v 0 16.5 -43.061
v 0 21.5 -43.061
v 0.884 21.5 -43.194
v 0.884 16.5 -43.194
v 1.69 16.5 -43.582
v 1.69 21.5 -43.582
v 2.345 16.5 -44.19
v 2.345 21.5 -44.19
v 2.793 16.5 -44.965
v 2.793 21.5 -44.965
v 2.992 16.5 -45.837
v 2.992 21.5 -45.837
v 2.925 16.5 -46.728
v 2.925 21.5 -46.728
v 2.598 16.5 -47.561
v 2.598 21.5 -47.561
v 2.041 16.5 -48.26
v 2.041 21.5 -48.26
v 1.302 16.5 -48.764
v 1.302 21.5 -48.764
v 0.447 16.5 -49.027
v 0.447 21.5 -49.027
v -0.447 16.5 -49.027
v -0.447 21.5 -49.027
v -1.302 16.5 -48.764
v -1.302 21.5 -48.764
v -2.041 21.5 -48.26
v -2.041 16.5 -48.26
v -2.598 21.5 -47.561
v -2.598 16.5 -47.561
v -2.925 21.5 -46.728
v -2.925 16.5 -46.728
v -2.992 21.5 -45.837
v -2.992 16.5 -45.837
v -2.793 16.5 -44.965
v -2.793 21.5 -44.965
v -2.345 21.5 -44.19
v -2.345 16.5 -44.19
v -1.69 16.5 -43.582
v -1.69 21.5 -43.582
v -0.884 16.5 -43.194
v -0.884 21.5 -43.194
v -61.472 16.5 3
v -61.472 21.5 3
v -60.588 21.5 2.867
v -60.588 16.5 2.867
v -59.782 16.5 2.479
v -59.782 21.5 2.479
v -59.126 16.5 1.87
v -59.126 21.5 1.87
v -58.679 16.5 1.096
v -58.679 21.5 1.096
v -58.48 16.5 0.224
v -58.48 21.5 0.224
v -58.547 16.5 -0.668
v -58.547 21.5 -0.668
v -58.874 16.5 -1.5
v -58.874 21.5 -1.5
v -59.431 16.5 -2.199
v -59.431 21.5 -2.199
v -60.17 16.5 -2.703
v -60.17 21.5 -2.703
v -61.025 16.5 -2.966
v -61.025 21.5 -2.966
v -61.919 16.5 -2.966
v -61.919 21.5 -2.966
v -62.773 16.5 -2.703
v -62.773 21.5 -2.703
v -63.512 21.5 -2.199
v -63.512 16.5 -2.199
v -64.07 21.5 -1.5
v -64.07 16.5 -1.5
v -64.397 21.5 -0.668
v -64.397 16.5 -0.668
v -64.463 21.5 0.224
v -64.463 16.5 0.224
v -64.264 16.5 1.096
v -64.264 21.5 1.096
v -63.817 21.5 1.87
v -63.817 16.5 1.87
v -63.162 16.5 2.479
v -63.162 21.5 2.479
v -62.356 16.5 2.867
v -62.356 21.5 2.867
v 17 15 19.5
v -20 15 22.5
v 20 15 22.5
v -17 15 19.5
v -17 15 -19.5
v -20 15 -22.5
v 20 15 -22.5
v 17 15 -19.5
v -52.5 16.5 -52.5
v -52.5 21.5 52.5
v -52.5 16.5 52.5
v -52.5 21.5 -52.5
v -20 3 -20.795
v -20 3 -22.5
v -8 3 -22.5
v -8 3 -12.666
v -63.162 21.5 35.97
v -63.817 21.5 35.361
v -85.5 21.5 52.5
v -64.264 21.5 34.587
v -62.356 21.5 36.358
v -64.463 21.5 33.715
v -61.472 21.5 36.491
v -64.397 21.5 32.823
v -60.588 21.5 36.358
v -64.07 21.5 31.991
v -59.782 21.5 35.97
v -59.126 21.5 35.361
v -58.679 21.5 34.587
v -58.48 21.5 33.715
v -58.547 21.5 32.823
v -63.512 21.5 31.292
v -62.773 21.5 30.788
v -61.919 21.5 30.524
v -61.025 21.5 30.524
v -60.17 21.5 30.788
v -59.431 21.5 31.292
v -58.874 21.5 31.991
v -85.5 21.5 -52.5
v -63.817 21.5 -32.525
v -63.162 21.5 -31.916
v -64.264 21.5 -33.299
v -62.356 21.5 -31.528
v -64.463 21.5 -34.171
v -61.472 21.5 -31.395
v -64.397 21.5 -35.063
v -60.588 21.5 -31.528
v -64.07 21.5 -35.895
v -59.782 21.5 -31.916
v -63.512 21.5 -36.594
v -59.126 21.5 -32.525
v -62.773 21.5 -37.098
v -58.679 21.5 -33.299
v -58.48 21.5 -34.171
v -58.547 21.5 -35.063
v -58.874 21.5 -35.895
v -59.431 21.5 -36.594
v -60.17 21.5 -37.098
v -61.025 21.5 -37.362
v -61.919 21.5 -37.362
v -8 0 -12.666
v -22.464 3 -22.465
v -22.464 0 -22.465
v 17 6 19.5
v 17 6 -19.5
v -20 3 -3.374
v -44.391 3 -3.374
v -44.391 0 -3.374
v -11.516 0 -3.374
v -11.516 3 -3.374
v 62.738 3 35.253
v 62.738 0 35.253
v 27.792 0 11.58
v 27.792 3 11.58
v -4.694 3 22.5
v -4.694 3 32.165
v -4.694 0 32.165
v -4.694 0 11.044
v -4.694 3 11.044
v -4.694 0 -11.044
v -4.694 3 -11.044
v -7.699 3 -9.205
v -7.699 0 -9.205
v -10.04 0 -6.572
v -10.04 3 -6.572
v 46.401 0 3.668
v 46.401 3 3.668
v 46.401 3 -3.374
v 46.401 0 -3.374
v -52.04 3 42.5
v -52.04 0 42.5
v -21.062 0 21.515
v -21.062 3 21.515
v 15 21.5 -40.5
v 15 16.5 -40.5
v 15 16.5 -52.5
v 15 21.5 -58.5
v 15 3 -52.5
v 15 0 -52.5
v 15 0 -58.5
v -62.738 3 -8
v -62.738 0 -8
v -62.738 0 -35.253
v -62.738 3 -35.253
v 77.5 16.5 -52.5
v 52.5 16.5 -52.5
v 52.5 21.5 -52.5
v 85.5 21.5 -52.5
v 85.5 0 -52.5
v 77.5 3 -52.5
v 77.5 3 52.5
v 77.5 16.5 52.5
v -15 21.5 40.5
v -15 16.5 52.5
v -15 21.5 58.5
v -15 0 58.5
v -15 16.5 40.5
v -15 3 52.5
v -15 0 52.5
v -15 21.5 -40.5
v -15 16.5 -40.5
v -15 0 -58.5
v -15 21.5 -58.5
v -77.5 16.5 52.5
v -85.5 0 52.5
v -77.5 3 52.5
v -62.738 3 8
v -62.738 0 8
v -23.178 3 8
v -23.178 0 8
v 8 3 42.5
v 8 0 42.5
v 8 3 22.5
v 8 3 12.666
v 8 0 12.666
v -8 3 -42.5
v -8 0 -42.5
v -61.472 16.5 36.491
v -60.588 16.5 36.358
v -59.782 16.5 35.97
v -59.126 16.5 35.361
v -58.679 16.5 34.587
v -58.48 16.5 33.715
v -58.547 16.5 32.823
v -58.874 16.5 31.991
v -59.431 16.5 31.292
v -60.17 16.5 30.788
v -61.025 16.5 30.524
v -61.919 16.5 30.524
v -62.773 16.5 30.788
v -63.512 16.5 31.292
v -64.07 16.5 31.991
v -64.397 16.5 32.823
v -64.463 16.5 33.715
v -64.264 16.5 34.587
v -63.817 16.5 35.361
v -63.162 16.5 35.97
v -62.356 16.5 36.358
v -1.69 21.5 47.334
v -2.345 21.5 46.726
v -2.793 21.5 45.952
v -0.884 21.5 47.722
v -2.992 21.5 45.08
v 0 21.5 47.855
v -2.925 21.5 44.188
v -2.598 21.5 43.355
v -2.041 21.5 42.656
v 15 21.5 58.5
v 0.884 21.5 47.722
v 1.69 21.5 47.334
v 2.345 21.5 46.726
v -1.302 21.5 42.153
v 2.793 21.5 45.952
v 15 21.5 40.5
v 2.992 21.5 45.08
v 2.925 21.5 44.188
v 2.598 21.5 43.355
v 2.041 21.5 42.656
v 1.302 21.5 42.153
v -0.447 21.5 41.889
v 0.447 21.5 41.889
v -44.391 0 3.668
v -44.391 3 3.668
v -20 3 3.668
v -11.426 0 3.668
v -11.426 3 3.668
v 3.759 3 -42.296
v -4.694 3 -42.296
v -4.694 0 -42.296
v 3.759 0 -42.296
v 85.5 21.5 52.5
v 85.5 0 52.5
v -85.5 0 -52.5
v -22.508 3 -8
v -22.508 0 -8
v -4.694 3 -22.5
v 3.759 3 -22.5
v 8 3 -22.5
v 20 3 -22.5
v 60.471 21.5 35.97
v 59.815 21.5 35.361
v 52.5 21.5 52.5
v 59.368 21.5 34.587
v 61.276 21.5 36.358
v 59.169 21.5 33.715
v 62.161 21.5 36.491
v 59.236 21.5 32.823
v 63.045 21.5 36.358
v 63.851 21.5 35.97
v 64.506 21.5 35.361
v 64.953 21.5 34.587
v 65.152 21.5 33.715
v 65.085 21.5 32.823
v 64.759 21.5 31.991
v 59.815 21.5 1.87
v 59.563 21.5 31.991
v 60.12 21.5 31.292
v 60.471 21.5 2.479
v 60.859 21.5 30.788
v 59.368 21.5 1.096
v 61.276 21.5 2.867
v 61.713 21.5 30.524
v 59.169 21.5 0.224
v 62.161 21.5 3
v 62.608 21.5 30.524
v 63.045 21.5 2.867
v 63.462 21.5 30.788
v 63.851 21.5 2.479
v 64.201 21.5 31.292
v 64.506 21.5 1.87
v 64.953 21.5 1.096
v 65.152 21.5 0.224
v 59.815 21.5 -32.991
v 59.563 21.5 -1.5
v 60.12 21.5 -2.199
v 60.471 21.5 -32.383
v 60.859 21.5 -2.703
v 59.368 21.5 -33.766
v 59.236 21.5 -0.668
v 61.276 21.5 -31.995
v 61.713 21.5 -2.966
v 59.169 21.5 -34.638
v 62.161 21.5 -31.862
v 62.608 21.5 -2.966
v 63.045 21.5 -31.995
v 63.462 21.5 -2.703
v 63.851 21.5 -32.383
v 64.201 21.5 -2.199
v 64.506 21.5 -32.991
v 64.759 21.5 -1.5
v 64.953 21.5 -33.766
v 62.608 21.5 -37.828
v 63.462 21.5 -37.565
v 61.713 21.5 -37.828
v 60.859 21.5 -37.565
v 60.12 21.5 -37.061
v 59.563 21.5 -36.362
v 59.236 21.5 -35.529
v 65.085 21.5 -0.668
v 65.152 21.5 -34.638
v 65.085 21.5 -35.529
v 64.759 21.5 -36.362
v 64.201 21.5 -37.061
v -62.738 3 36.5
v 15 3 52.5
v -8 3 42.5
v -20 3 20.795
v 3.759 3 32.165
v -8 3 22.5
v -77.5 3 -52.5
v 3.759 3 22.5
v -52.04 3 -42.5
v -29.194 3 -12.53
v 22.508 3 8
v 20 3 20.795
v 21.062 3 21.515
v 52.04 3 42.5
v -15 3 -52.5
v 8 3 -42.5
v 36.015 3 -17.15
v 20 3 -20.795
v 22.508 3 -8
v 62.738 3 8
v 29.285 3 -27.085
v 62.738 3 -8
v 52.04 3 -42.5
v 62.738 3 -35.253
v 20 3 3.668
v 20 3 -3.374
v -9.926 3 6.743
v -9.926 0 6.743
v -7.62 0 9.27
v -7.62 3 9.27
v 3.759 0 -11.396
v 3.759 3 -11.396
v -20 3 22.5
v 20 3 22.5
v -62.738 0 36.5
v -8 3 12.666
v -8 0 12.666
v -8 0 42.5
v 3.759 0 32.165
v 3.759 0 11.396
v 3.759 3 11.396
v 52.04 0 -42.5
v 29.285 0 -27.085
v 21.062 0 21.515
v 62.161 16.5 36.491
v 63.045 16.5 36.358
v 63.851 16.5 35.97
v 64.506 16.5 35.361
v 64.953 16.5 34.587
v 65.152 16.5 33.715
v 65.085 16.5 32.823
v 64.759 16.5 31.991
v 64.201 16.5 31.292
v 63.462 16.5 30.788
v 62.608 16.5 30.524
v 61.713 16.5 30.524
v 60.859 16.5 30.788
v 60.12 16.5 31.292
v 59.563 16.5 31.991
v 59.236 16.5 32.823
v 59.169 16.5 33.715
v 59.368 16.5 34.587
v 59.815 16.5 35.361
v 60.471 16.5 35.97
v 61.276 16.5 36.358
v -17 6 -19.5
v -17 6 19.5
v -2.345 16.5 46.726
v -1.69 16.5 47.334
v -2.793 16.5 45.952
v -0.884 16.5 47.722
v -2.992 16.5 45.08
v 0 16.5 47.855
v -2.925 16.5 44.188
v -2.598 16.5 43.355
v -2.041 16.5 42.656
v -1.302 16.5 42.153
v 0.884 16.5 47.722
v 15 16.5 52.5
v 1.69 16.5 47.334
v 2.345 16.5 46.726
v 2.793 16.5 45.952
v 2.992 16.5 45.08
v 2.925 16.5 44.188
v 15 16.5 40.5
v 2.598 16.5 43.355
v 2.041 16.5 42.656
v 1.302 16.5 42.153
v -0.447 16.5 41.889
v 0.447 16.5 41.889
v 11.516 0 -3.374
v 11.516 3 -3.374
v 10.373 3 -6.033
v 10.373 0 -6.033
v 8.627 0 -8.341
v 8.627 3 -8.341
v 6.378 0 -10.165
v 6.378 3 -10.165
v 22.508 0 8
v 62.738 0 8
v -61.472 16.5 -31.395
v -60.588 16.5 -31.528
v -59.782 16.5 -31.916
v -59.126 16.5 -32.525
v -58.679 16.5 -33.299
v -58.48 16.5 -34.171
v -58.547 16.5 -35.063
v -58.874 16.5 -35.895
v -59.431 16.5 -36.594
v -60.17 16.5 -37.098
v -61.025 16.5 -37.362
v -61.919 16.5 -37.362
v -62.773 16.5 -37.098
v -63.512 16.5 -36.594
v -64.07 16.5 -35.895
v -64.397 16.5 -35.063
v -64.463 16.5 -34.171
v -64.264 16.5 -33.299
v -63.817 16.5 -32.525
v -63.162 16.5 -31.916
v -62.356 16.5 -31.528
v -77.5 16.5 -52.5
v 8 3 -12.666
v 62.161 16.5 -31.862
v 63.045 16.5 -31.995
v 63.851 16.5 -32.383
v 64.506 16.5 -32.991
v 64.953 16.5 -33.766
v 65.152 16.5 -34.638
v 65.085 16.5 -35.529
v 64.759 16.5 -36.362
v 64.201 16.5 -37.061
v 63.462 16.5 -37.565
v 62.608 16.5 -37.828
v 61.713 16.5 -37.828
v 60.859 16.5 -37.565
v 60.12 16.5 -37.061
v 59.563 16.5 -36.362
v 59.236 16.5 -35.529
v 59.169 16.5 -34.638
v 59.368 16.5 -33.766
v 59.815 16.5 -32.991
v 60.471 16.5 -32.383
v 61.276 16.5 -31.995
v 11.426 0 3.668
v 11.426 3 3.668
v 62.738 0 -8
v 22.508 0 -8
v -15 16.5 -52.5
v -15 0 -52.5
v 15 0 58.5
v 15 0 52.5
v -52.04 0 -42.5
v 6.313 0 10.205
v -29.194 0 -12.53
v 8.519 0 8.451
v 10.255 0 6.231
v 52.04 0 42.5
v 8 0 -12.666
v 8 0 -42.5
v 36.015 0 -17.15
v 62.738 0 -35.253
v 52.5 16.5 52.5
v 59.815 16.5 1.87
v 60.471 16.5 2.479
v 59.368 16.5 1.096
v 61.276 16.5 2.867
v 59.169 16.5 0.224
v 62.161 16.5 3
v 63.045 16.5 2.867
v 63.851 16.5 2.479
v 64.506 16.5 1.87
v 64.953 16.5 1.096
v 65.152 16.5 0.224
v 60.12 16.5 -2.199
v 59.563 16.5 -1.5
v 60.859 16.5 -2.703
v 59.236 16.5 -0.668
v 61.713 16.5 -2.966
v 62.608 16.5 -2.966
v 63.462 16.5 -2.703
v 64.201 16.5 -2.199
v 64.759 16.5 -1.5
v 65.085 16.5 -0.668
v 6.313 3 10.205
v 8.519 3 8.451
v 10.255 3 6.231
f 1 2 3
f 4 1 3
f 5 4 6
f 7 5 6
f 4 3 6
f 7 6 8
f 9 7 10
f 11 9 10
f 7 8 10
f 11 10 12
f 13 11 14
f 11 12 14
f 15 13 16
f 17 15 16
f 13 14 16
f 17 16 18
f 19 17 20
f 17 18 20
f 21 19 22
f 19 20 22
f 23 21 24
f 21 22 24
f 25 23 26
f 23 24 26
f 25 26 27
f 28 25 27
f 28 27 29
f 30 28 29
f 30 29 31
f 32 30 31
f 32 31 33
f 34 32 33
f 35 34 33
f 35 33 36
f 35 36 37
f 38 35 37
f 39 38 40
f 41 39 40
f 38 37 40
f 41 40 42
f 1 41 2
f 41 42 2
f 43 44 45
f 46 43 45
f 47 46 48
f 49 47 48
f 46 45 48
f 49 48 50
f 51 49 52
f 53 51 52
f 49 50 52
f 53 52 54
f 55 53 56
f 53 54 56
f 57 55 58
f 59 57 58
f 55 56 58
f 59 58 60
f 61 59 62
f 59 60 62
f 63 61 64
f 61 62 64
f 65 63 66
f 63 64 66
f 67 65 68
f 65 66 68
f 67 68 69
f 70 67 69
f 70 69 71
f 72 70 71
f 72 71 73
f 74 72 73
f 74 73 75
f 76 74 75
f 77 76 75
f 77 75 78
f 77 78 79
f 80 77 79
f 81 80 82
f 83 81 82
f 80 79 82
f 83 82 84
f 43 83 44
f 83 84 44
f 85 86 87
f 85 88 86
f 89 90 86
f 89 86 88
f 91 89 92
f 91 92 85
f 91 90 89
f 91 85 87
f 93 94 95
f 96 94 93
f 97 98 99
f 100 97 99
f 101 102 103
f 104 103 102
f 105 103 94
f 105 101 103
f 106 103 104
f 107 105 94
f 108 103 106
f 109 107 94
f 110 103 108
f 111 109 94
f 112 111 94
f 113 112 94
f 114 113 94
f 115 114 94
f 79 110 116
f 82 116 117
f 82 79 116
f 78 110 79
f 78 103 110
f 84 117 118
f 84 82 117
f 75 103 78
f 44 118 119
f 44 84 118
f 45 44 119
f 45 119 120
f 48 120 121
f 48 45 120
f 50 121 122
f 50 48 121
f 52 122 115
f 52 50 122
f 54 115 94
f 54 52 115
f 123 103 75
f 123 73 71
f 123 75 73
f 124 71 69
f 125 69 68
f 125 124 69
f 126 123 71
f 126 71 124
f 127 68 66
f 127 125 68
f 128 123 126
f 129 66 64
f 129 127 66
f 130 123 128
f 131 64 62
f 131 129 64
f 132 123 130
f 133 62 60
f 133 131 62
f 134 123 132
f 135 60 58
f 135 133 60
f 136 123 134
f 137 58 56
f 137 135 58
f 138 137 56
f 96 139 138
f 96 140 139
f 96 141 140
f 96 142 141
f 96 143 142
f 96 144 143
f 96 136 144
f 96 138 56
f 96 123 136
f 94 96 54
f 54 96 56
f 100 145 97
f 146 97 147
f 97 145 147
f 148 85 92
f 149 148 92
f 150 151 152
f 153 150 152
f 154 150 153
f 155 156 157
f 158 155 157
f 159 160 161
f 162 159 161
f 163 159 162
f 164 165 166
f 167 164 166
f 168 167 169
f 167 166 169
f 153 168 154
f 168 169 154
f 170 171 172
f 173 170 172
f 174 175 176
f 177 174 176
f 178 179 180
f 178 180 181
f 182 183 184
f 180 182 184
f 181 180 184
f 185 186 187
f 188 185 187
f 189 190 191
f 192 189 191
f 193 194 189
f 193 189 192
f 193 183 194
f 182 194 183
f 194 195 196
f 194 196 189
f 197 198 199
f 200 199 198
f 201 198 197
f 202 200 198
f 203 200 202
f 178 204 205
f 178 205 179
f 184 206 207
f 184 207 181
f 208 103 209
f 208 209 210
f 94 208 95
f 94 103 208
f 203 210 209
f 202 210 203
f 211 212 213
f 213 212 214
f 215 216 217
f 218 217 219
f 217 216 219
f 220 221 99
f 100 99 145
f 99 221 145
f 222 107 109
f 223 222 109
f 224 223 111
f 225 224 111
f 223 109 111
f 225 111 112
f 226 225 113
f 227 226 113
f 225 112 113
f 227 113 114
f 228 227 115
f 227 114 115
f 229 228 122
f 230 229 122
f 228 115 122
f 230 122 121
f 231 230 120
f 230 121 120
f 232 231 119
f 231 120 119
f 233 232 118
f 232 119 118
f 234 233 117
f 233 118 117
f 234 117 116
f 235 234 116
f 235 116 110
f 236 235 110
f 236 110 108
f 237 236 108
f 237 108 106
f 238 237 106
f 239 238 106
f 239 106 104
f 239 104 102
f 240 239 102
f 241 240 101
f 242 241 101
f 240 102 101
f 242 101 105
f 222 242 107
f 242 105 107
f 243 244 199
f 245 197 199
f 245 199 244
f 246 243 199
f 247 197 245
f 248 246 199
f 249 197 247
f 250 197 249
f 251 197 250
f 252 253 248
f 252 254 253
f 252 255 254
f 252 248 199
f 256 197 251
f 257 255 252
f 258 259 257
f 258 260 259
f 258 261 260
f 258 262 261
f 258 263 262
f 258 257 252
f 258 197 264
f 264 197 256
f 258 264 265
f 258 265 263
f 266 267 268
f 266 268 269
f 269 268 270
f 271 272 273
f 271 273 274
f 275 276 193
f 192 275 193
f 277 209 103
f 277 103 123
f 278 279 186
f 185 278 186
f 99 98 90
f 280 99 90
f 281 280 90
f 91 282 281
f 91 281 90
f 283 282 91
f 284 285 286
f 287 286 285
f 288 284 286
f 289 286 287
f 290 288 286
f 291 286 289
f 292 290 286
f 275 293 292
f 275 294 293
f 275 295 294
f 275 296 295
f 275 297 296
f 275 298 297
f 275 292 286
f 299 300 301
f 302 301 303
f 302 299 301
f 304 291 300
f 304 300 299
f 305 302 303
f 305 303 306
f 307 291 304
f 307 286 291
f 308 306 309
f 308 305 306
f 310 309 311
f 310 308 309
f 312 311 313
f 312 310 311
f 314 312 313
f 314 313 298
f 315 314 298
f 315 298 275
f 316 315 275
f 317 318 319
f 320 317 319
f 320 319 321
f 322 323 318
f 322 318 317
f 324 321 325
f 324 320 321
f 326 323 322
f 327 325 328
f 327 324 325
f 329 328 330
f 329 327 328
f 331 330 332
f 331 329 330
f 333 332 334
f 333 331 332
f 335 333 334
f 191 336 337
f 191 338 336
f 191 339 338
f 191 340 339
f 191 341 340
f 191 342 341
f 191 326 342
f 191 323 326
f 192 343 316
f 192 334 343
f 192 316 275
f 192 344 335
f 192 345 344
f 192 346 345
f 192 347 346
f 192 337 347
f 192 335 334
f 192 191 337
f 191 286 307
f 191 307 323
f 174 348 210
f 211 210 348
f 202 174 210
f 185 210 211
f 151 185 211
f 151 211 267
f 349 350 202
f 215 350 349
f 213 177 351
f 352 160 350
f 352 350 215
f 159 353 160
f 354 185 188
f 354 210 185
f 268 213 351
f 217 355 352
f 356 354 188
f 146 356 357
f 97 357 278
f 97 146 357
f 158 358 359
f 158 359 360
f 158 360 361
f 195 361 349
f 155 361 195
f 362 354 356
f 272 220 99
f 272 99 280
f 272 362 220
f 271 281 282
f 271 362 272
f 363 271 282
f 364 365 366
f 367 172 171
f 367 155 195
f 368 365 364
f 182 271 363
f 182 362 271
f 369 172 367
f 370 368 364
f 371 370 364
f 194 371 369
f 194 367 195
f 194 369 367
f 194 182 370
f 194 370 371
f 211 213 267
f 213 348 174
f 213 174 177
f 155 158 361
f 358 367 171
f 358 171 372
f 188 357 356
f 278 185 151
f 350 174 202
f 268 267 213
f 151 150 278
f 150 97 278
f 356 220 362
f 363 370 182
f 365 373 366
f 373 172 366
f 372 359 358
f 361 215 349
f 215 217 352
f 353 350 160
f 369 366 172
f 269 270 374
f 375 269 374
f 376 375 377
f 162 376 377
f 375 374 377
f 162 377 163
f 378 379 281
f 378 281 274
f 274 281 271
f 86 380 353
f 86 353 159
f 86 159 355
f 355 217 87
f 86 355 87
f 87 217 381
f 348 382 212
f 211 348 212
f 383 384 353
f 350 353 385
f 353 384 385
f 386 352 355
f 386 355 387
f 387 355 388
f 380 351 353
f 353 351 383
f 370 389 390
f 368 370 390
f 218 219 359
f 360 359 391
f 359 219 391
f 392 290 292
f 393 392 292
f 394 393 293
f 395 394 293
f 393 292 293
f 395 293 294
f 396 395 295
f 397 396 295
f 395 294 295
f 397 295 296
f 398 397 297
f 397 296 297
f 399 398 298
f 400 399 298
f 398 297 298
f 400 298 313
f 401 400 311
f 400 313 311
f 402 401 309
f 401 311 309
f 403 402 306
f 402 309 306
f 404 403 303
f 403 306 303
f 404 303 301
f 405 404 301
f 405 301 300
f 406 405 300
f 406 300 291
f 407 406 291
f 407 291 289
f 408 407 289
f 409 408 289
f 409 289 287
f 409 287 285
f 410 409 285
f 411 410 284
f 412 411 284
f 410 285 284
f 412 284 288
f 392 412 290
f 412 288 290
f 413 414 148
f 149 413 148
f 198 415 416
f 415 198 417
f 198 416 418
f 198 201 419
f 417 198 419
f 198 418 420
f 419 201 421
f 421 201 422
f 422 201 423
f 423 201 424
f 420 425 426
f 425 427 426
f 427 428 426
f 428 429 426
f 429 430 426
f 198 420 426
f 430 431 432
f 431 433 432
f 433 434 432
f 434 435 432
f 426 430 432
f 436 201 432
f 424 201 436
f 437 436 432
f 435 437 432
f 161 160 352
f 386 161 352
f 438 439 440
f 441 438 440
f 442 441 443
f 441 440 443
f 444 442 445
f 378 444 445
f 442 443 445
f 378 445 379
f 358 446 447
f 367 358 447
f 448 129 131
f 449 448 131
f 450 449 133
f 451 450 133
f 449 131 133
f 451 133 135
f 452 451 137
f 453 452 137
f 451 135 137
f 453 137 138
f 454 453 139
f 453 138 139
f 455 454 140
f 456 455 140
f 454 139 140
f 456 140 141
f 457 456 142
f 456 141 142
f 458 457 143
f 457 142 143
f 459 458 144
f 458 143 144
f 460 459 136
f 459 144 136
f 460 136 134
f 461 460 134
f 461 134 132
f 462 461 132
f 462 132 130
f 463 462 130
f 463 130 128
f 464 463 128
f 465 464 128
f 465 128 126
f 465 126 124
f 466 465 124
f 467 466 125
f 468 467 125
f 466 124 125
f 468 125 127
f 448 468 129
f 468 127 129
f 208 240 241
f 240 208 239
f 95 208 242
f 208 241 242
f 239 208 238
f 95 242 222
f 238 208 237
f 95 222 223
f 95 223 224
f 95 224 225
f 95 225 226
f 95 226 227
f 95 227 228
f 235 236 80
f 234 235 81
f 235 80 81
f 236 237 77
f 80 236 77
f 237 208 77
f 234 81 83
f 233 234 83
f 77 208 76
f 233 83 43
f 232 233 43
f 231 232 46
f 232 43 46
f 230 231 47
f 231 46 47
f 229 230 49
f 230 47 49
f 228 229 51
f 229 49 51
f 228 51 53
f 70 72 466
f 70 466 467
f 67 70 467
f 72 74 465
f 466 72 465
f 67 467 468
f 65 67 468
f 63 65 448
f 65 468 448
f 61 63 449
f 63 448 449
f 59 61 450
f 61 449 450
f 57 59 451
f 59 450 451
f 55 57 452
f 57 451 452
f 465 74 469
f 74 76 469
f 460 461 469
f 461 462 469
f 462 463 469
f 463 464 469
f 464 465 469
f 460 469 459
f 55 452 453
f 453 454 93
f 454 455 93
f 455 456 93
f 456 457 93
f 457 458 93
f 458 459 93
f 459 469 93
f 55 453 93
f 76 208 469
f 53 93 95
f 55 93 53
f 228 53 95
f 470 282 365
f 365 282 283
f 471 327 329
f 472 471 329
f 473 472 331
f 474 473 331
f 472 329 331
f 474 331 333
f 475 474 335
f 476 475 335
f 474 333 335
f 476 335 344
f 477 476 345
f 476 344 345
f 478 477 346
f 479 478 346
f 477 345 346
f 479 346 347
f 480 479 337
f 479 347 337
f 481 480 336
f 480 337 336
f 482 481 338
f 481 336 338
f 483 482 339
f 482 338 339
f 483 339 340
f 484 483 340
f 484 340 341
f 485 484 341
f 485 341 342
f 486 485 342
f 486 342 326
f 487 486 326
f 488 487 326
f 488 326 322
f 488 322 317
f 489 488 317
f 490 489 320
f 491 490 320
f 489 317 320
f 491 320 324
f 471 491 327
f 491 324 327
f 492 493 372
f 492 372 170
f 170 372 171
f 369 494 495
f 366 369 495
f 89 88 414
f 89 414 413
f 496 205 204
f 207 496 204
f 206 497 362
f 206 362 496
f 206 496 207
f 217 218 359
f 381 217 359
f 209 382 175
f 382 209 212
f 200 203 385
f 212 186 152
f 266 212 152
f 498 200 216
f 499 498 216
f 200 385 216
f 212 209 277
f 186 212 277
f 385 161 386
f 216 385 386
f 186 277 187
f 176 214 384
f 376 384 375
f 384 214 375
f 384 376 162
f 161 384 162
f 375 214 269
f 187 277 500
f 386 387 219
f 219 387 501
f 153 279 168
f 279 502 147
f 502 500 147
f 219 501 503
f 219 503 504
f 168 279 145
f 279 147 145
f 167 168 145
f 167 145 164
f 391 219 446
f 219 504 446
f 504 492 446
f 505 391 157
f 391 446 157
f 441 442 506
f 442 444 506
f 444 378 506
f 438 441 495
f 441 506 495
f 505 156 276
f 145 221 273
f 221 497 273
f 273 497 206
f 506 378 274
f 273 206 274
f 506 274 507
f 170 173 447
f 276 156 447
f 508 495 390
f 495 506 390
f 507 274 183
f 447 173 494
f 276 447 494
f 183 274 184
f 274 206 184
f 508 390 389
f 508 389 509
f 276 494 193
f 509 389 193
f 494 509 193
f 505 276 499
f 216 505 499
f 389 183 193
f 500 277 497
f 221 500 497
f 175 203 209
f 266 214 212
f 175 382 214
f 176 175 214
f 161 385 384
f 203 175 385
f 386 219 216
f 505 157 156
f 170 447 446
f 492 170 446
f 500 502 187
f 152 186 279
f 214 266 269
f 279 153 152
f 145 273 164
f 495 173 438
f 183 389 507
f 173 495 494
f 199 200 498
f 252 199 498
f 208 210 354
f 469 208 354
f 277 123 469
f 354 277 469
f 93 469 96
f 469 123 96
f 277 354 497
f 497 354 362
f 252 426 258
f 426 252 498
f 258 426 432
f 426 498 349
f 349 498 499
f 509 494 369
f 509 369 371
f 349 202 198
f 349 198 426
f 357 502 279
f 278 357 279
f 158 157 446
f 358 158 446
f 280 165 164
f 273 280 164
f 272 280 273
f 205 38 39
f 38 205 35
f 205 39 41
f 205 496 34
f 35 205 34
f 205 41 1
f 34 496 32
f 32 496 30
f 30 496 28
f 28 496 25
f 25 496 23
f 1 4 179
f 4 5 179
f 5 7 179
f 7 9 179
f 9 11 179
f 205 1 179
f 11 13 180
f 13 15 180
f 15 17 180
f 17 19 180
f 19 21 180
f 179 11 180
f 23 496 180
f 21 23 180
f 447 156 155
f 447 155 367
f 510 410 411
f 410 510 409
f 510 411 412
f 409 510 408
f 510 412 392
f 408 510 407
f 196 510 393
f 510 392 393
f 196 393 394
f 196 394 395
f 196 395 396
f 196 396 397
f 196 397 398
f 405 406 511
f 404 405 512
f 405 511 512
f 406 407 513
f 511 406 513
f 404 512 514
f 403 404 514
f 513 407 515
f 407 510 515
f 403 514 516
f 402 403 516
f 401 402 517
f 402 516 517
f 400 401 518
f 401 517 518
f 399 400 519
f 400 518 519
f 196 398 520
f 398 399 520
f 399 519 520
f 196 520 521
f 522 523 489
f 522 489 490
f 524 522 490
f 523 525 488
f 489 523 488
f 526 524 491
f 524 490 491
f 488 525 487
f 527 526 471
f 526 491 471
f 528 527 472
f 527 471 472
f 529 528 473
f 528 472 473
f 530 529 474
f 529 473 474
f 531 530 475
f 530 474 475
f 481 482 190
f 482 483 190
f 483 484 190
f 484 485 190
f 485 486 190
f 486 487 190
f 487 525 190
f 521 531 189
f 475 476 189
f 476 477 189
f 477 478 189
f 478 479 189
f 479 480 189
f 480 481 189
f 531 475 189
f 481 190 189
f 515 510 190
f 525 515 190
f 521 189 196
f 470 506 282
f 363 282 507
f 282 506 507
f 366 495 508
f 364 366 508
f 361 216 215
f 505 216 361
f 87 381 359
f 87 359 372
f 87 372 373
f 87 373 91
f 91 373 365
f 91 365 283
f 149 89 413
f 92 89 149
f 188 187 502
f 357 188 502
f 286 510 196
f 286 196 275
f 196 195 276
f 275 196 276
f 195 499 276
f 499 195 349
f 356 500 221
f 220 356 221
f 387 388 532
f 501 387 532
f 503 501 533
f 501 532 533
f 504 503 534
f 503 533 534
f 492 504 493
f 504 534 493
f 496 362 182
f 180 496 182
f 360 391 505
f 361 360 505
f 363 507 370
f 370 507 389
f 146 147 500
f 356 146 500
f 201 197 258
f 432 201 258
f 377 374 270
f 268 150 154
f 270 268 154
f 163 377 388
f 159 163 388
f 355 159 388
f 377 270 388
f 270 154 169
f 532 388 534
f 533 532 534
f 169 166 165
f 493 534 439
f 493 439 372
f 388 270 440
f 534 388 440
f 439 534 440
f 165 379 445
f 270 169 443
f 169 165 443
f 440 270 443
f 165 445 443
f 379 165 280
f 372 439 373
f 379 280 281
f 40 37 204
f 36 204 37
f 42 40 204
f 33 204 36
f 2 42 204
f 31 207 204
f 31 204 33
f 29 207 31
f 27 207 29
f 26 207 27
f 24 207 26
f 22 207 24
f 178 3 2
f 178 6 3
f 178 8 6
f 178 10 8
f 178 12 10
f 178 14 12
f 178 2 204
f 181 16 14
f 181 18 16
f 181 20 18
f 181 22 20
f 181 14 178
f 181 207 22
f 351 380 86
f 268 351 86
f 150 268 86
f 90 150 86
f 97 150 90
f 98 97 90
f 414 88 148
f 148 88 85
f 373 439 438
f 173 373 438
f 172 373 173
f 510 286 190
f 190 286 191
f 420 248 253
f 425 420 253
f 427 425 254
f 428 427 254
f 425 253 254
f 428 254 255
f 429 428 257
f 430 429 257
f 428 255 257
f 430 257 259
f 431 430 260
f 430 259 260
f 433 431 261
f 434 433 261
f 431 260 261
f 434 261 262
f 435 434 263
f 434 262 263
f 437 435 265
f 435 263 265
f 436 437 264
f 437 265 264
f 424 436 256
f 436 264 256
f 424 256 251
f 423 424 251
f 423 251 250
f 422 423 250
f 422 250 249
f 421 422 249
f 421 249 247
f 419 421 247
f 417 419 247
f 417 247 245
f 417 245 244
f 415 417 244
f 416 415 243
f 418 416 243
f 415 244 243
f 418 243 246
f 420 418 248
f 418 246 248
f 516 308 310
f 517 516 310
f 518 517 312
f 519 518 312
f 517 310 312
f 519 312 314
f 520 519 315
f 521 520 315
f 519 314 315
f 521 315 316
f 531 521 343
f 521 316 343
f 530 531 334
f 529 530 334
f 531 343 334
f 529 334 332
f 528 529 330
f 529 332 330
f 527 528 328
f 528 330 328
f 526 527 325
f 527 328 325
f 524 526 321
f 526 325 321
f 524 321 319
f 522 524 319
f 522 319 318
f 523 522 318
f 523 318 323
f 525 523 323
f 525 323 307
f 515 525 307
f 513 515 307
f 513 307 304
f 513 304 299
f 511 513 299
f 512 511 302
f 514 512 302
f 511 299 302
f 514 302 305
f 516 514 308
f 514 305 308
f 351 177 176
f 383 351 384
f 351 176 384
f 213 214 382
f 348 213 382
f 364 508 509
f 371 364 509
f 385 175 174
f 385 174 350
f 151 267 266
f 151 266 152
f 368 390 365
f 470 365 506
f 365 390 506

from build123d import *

# Parameters (mm, degrees)
SKETCH1_W                = 155
SKETCH1_H                = 105
SKETCH1_W_2              = 125.476190476
SKETCH1_H_2              = 85
BOSS_EXTRUDE1_DEPTH      = 3
BOSS_EXTRUDE2_DEPTH      = 18.5
BOSS_EXTRUDE2_DEPTH_BACK = 3
SKETCH2_W                = 8
SKETCH2_H                = 105
BOSS_EXTRUDE3_DEPTH      = 18.5
BOSS_EXTRUDE3_DEPTH_BACK = 3
SKETCH3_W                = 30
SKETCH3_H                = 6
SKETCH4_W                = 25
SKETCH4_H                = 105
SKETCH4_W_2              = 30
SKETCH4_H_2              = 12
BOSS_EXTRUDE4_DEPTH      = 5
SKETCH5_R                = 12
SKETCH5_W                = 8.45267088
SKETCH5_H                = 74.460442491
SKETCH5_W_2              = 90.792338418
SKETCH5_H_2              = 7.04119429
CUT_EXTRUDE1_DEPTH       = 5
SKETCH7_R                = 3
CUT_EXTRUDE3_DEPTH       = 5
SKETCH8_W                = 40
SKETCH8_H                = 45
BOSS_EXTRUDE7_DEPTH      = 12
SKETCH10_W               = 34
SKETCH10_H               = 39
CUT_EXTRUDE4_DEPTH       = 9


with BuildPart() as part:
    # Sketch1 → Boss-Extrude1 (new body)
    # profile 1 of 2: a face of its own
    with BuildSketch(Plane(origin=(0, 0, 0), x_dir=(1, 0, 0), z_dir=(0, 1, 0))):
        Rectangle(SKETCH1_W, SKETCH1_H)
        Rectangle(SKETCH1_W_2, SKETCH1_H_2, mode=Mode.SUBTRACT)
    # profile 2 of 2: a face of its own
    with BuildSketch(Plane(origin=(0, 0, 0), x_dir=(1, 0, 0), z_dir=(0, 1, 0))):
        Polygon((62.738095238, 8), (22.507606796, 8), (36.015047402, 17.1502017), (62.738095238, 35.252911525), (62.738095238, 42.5), (52.040012251, 42.5), (29.28486966, 27.085225986), (8, 12.666443314), (8, 42.5), (-8, 42.5), (-8, 12.666443314), (-22.464140061, 22.464731742), (-52.040012251, 42.5), (-62.738095238, 42.5), (-62.738095238, 35.252911525), (-29.194317803, 12.529707456), (-22.507606796, 8), (-62.738095238, 8), (-62.738095238, -8), (-23.178437825, -8), (-62.738095238, -36.5), (-62.738095238, -42.5), (-52.040012251, -42.5), (-21.061503369, -21.514558499), (-8, -12.666443314), (-8, -42.5), (8, -42.5), (8, -12.666443314), (21.061503369, -21.514558499), (52.040012251, -42.5), (62.738095238, -42.5), (62.738095238, -35.252911525), (27.791681111, -11.579534213), (22.507606796, -8), (62.738095238, -8), align=None)
    extrude(amount=BOSS_EXTRUDE1_DEPTH)

    # Sketch2 → Boss-Extrude2 (add, two sides: drawn at the far end of the back side and taken through both)
    with BuildSketch(Plane(origin=(0, 3, 0), x_dir=(1, 0, 0), z_dir=(0, 1, 0)).offset(-BOSS_EXTRUDE2_DEPTH_BACK)):
        with Locations((-81.5, 0)):
            Rectangle(SKETCH2_W, SKETCH2_H)
        with Locations((81.5, 0)):
            Rectangle(SKETCH2_W, SKETCH2_H)
    extrude(amount=BOSS_EXTRUDE2_DEPTH + BOSS_EXTRUDE2_DEPTH_BACK)

    # Sketch3 → Boss-Extrude3 (add, two sides: drawn at the far end of the back side and taken through both)
    with BuildSketch(Plane(origin=(0, 3, 0), x_dir=(1, 0, 0), z_dir=(0, 1, 0)).offset(-BOSS_EXTRUDE3_DEPTH_BACK)):
        with Locations((0, -55.5)):
            Rectangle(SKETCH3_W, SKETCH3_H)
        with Locations((0, 55.5)):
            Rectangle(SKETCH3_W, SKETCH3_H)
    extrude(amount=BOSS_EXTRUDE3_DEPTH + BOSS_EXTRUDE3_DEPTH_BACK)

    # Sketch4 → Boss-Extrude4 (add)
    with BuildSketch(Plane(origin=(0, 21.5, 0), x_dir=(1, 0, 0), z_dir=(0, 1, 0))):
        with Locations((-65, 0)):
            Rectangle(SKETCH4_W, SKETCH4_H)
        with Locations((65, 0)):
            Rectangle(SKETCH4_W, SKETCH4_H)
        with Locations((0, 46.5)):
            Rectangle(SKETCH4_W_2, SKETCH4_H_2)
        with Locations((0, -46.5)):
            Rectangle(SKETCH4_W_2, SKETCH4_H_2)
    extrude(amount=-BOSS_EXTRUDE4_DEPTH)

    # Sketch5 → Cut-Extrude1 (cut)
    with BuildSketch(Plane(origin=(0, 3, 0), x_dir=(1, 0, 0), z_dir=(0, 1, 0))):
        Circle(SKETCH5_R)
        with Locations((-0.467592264, 5.065542336)):
            Rectangle(SKETCH5_W, SKETCH5_H)
        with Locations((1.005079981, -0.147085174)):
            Rectangle(SKETCH5_W_2, SKETCH5_H_2)
    extrude(amount=-CUT_EXTRUDE1_DEPTH, mode=Mode.SUBTRACT)

    # Sketch7 → Cut-Extrude3 (cut)
    with BuildSketch(Plane(origin=(0, 21.5, 0), x_dir=(1, 0, 0), z_dir=(0, 1, 0))):
        with Locations(Location((-61.471836621, 0, 0), (0, 0, 270))):
            Circle(SKETCH7_R)
        with Locations(Location((62.160596695, 0, 0), (0, 0, 270))):
            Circle(SKETCH7_R)
        with Locations(Location((-61.471836621, 34.395123429, 0), (0, 0, 270))):
            Circle(SKETCH7_R)
        with Locations(Location((-61.471836621, -33.490958607, 0), (0, 0, 270))):
            Circle(SKETCH7_R)
        with Locations(Location((62.160596695, 34.861702835, 0), (0, 0, 270))):
            Circle(SKETCH7_R)
        with Locations(Location((62.160596695, -33.490958607, 0), (0, 0, 270))):
            Circle(SKETCH7_R)
        with Locations(Location((0, -44.855499831, 0), (0, 0, 270))):
            Circle(SKETCH7_R)
        with Locations(Location((0, 46.060829961, 0), (0, 0, 270))):
            Circle(SKETCH7_R)
    extrude(amount=-CUT_EXTRUDE3_DEPTH, mode=Mode.SUBTRACT)

    # Sketch8 → Boss-Extrude7 (add)
    with BuildSketch(Plane(origin=(0, 3, 0), x_dir=(1, 0, 0), z_dir=(0, 1, 0))):
        Rectangle(SKETCH8_W, SKETCH8_H)
    extrude(amount=BOSS_EXTRUDE7_DEPTH)

    # Sketch10 → Cut-Extrude4 (cut)
    with BuildSketch(Plane(origin=(0, 15, 0), x_dir=(1, 0, 0), z_dir=(0, 1, 0))):
        Rectangle(SKETCH10_W, SKETCH10_H)
    extrude(amount=-CUT_EXTRUDE4_DEPTH, mode=Mode.SUBTRACT)


solid = part.part
